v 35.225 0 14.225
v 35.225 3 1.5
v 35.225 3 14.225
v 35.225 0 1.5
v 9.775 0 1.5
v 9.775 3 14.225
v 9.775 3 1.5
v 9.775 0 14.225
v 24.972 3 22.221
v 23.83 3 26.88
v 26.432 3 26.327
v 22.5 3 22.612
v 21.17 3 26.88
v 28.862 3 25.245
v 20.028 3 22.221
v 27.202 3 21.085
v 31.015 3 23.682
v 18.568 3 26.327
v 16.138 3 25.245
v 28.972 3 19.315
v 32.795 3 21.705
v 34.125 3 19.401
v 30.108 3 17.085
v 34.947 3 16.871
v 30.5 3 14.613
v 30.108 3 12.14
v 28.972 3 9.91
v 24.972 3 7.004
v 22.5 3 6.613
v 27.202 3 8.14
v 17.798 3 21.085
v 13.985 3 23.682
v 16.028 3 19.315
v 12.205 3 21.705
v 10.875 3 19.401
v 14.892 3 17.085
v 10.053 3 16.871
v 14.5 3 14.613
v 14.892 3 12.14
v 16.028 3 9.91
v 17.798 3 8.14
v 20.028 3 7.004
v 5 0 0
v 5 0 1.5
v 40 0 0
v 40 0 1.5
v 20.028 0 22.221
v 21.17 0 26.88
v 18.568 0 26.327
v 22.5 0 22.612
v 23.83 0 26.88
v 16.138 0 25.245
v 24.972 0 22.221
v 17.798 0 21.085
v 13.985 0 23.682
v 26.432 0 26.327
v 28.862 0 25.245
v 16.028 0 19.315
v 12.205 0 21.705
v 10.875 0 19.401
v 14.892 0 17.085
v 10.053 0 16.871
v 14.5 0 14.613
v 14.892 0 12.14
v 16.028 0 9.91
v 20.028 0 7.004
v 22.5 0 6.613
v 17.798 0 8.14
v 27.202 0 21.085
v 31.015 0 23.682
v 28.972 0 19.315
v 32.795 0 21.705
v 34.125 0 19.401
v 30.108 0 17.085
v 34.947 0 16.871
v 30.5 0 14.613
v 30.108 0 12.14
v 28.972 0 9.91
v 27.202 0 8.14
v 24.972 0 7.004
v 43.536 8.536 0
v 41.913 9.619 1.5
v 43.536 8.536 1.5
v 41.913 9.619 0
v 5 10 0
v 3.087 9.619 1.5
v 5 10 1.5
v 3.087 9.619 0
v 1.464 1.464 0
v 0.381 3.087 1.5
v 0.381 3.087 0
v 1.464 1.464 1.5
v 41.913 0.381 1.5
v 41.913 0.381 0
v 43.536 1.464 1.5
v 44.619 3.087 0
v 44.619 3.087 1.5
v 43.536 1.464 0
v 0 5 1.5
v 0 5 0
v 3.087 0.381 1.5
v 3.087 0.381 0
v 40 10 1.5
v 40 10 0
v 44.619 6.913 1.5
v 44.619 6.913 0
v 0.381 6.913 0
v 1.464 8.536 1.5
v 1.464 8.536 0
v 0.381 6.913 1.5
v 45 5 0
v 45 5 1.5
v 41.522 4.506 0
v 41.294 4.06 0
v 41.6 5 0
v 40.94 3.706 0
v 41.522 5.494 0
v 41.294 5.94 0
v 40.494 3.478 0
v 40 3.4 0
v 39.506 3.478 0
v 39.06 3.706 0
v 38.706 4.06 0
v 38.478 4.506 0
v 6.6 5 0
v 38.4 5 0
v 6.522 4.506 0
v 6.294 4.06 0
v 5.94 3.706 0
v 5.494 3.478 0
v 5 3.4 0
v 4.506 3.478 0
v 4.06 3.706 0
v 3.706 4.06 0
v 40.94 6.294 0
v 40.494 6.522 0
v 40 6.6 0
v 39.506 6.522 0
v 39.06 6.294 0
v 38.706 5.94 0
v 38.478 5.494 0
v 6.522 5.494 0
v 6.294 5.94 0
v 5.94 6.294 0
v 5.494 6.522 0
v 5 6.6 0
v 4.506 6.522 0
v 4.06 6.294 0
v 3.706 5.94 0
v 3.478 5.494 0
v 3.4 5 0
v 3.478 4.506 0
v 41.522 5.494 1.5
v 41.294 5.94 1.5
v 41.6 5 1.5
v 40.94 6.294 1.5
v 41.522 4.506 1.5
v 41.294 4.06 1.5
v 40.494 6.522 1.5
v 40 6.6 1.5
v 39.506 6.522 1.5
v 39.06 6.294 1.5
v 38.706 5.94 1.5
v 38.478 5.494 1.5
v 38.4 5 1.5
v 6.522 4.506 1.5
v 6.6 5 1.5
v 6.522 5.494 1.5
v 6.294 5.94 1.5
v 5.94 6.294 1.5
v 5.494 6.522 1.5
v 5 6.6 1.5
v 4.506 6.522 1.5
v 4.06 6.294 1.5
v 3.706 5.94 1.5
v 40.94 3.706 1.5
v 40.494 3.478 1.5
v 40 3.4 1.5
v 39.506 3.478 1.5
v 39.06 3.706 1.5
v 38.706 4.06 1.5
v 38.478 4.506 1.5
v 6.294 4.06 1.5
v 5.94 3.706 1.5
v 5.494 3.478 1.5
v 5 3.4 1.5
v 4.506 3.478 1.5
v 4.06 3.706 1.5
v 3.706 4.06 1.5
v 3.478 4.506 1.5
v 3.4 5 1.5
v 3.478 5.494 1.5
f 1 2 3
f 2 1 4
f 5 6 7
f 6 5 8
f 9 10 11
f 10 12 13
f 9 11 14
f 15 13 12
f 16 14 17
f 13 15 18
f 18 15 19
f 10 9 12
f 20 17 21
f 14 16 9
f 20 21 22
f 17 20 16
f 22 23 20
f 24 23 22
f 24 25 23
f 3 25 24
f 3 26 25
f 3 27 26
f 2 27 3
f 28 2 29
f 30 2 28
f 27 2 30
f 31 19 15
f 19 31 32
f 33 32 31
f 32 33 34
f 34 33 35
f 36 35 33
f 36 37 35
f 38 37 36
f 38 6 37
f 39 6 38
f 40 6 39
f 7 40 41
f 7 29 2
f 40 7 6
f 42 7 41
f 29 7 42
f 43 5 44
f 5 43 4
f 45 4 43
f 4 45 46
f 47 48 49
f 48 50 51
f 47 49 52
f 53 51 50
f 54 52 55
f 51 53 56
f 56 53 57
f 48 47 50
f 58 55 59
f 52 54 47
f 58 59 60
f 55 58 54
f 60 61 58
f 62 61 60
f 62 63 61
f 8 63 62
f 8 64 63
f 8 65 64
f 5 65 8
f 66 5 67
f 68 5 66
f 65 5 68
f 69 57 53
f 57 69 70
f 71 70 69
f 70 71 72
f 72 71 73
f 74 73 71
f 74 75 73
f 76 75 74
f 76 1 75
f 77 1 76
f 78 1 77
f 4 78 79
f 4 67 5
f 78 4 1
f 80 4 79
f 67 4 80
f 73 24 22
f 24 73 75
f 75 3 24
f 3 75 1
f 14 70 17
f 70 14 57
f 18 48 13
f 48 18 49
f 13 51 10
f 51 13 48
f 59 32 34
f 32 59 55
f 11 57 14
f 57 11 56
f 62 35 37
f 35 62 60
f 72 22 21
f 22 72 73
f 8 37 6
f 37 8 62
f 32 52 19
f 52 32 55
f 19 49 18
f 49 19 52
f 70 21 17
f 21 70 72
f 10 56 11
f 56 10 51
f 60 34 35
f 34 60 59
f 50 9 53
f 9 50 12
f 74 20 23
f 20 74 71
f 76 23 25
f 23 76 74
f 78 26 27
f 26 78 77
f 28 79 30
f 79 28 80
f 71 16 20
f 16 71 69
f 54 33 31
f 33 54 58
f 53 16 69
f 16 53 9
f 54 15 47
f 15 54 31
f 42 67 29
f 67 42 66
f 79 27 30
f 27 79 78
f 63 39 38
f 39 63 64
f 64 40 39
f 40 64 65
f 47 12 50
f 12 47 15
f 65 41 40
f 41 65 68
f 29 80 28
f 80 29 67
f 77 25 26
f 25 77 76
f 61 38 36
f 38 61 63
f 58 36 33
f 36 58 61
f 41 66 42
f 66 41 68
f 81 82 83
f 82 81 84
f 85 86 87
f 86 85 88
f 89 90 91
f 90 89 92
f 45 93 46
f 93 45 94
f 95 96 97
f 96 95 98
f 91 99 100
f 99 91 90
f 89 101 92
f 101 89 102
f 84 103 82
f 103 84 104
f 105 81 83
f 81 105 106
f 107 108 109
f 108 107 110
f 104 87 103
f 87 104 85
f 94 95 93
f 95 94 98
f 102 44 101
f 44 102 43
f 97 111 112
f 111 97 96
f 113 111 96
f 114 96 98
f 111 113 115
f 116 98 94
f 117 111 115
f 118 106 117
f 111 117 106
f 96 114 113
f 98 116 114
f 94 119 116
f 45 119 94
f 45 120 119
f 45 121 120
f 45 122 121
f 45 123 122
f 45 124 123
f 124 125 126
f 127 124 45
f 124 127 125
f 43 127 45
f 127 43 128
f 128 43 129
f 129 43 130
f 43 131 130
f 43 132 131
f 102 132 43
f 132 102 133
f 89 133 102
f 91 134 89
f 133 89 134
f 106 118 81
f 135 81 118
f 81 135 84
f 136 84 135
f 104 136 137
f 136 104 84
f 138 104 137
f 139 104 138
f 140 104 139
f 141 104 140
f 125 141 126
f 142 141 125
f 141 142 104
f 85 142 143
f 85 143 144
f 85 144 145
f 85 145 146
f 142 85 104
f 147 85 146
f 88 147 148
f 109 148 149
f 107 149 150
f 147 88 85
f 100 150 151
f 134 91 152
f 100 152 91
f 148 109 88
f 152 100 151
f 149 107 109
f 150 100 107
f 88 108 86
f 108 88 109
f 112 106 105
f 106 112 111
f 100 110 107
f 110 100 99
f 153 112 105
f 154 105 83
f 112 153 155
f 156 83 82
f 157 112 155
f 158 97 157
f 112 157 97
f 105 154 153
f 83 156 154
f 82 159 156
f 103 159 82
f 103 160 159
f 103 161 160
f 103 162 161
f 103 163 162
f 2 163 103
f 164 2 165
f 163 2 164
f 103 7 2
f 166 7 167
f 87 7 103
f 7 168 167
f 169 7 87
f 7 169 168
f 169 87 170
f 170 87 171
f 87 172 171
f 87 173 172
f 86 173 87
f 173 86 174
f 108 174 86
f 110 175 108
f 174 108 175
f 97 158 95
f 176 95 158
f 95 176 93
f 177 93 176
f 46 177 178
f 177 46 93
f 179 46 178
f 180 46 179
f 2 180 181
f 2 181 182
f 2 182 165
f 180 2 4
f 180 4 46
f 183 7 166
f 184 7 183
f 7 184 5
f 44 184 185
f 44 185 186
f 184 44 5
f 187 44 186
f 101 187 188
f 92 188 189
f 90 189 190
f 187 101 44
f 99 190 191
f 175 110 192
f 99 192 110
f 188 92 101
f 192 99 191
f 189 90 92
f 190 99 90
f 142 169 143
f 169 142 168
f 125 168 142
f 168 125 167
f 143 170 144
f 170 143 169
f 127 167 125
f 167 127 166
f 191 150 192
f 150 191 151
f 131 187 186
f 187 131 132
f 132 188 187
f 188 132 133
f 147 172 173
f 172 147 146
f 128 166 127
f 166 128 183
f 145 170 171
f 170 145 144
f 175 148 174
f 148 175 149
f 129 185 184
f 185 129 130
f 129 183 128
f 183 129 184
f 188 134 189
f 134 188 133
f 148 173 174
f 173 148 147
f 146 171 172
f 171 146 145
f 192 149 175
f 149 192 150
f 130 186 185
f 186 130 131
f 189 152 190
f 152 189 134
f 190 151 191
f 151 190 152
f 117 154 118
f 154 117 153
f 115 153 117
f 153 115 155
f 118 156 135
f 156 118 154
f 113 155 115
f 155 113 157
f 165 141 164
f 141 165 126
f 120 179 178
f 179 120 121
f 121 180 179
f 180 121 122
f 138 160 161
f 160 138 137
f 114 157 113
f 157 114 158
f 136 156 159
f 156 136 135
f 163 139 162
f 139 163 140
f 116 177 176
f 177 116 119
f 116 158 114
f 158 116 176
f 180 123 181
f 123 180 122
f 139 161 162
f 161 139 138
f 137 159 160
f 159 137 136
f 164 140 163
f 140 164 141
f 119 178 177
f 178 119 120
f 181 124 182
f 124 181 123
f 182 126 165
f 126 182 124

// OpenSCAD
//  MOUNT
//  Built the mount for the desired bolt type and number of cavities. Choose orientation relative to mount (0 for aligned, 1 for perpendicular)
mount("M3",2,1, bearing="pillow");
module mount(bolt, cav, orient, bearing=false)
{ 
    
//    Assign variables
    if (bolt=="M4") {
        base_w = 10;
        base_l = 45;
        base_h = 1.5;
        trap_w = 2.8;
        trap_l = 10;
        trap_h = 10;
        hole_r = 1.6;
        gap=3.3;
        bearing_D = 22;
        bearing_d = 7;
        bearing_w = 8;
        
        
        // Generate the primitive with M4 specs
        mountPrim(base_w, base_l, base_h, trap_w, trap_l, trap_h, gap, hole_r, cav, orient, bearing);
        
    } else if (bolt=="M3"){
        base_w = 10;
        base_l = 45;
        base_h = 1.5;
        trap_w = 2.9;
        trap_l = 10;
        trap_h = 10;
        hole_r = 1.6;
        gap=3.3;
        bearing_D = 22;
        bearing_d = 10; //actually 8, but giving some extra room
        bearing_w = 7;
        
        // Generate the primitive with M3 specs
        mountPrim(base_w, base_l, base_h, trap_w, trap_l, trap_h, gap, hole_r, cav, orient, bearing, bearing_D, bearing_d, bearing_w);
    }
}
    

// Primitive mount without specifications
module mountPrim(base_w, base_l, base_h, 
                 trap_w, trap_l, trap_h, 
                 gap, hole_r, cav, orient, bearing, bearing_D, bearing_d, bearing_w)
{
// Value needed to position pedestals away from edge
init_space = (base_w-gap-2*trap_w)/2;   
tot_trap_w = cav*gap+cav*trap_w+trap_w;
    
    
    difference(){
        union(){
            translate([0,base_w/2,0])
            hull(){
                translate([base_w/2,0,0]) cylinder(h=base_h, d=base_w);
                translate([base_l-base_w/2,0,0]) cylinder(h=base_h, d=base_w);
            }
            //cube([base_l,base_w,base_h]); // Base
            if (bearing==false){
                if(orient==0){
                    translate([(base_l-tot_trap_w)/2,init_space,0]) 
                    rotate([0,0,orient*90])
                    pedestal(base_l, base_h, trap_w, 
                                trap_l, trap_h, gap, 
                                cav, hole_r, init_space);
                
                } else if (orient==1){
                    rotate([0,0,orient*90]) translate([0,-(base_l+tot_trap_w)/2,0]) 
                    pedestal(base_l, base_h, trap_w, 
                            trap_l, trap_h, gap, 
                            cav, hole_r, init_space);
                }
            }
            
            // Make ball pearing pedestal
            else if (bearing==true){
                translate([base_l/2,base_w/2,((bearing_D+init_space)/2+base_h*2)/2])
                bearing(base_h, base_w, bearing_D+init_space, bearing_d+init_space, bearing_w+init_space);
            }
            
            else if (bearing=="pillow"){
                translate([base_l/2,base_h,((bearing_D+init_space)/2+base_h*2)/2])
                pillow_bearing(base_h, base_w, bearing_D+init_space, bearing_d+init_space, bearing_w+init_space);
            }
        }   
        
//      Holes in base
        for (i=[0,1]){
            translate([5+(i*(base_l-10)),5,-1]) cylinder(r=hole_r,h=3,$fn=20);
        }
    }
}


// Pedestal module
module pedestal(base_l, base_h, trap_w, trap_l, trap_h, gap, cav, hole_r, init_space)
{
    width= cav*gap+cav*trap_w+trap_w;
    difference(){
        union(){
            cube([trap_l,width,base_h+(trap_h-(trap_l/2))-2]);
                
    //          Make piedestals
            for (i = [0:cav]){
                translate([trap_l/2,i*trap_w+i*gap,0])  
                rotate([-90,180,0]) 
                hull(){
                    trap(trap_w, trap_l, trap_h);
                    translate([0,trap_h,0])
                    cylinder(r=trap_l/2,h=trap_w,center=false,$fn=200);
                }
            }
        }
        translate([trap_l/2,width,trap_l]) rotate([90,90,0]) 
        cylinder(r=hole_r,h=width,$fn=20);  
    }
}


//      Basic polygon used to make the curvatures
module  trap(trap_w, trap_l, trap_h)
{ // Assign variables
            
//     Make the shape
    linear_extrude(height = trap_w, center=false, convexity = 10, twist = 0, $fn = 20) 
    polygon(
        points = [
            [-trap_l/2,0],
            [-trap_l/2,1],
            [0,trap_h],
            [trap_l/2,1],
            [trap_l/2,0]],
        paths = [
            [0,1,2,3,4]]
           );
}

module bearing(base_h, base_w, bearing_D, bearing_d, bearing_w){
    
    difference(){
        union(){
            cube([bearing_D+2*base_h,base_w,bearing_D/2+base_h*2], center=true);
            rotate([90,0,0]) translate([0,bearing_D/4+base_h,0])
            cylinder(h=base_w, d=bearing_D+2*base_h, center=true);
        }
        rotate([90,0,0]) translate([0,bearing_D/4+base_h,-base_h/2]) 
        #cylinder(h=bearing_w+base_h, d=bearing_D, $fn=30, center=true);
        rotate([90,0,0]) 
        translate([0,bearing_D/4+base_h,(base_w-bearing_w)/2]) 
        cylinder(h=bearing_w, d=bearing_D-2*base_h, $fn=30, center=true);
    }
}
    
 module pillow_bearing(base_h, base_w, bearing_D, bearing_d, bearing_w, hole_r){
    difference(){
         #union(){
            cube([bearing_D+2*base_h,base_h*2,bearing_D/2+base_h*2], center=true);
            rotate([90,0,0]) translate([0,bearing_D/4+base_h,0])
            cylinder(h=base_h*2, d=bearing_D+2*base_h, center=true);
        }
        rotate([90,0,0]) translate([0,6+base_h,0]) cylinder(r=8,h=base_w,$fn=20, center=true);
    }
}
